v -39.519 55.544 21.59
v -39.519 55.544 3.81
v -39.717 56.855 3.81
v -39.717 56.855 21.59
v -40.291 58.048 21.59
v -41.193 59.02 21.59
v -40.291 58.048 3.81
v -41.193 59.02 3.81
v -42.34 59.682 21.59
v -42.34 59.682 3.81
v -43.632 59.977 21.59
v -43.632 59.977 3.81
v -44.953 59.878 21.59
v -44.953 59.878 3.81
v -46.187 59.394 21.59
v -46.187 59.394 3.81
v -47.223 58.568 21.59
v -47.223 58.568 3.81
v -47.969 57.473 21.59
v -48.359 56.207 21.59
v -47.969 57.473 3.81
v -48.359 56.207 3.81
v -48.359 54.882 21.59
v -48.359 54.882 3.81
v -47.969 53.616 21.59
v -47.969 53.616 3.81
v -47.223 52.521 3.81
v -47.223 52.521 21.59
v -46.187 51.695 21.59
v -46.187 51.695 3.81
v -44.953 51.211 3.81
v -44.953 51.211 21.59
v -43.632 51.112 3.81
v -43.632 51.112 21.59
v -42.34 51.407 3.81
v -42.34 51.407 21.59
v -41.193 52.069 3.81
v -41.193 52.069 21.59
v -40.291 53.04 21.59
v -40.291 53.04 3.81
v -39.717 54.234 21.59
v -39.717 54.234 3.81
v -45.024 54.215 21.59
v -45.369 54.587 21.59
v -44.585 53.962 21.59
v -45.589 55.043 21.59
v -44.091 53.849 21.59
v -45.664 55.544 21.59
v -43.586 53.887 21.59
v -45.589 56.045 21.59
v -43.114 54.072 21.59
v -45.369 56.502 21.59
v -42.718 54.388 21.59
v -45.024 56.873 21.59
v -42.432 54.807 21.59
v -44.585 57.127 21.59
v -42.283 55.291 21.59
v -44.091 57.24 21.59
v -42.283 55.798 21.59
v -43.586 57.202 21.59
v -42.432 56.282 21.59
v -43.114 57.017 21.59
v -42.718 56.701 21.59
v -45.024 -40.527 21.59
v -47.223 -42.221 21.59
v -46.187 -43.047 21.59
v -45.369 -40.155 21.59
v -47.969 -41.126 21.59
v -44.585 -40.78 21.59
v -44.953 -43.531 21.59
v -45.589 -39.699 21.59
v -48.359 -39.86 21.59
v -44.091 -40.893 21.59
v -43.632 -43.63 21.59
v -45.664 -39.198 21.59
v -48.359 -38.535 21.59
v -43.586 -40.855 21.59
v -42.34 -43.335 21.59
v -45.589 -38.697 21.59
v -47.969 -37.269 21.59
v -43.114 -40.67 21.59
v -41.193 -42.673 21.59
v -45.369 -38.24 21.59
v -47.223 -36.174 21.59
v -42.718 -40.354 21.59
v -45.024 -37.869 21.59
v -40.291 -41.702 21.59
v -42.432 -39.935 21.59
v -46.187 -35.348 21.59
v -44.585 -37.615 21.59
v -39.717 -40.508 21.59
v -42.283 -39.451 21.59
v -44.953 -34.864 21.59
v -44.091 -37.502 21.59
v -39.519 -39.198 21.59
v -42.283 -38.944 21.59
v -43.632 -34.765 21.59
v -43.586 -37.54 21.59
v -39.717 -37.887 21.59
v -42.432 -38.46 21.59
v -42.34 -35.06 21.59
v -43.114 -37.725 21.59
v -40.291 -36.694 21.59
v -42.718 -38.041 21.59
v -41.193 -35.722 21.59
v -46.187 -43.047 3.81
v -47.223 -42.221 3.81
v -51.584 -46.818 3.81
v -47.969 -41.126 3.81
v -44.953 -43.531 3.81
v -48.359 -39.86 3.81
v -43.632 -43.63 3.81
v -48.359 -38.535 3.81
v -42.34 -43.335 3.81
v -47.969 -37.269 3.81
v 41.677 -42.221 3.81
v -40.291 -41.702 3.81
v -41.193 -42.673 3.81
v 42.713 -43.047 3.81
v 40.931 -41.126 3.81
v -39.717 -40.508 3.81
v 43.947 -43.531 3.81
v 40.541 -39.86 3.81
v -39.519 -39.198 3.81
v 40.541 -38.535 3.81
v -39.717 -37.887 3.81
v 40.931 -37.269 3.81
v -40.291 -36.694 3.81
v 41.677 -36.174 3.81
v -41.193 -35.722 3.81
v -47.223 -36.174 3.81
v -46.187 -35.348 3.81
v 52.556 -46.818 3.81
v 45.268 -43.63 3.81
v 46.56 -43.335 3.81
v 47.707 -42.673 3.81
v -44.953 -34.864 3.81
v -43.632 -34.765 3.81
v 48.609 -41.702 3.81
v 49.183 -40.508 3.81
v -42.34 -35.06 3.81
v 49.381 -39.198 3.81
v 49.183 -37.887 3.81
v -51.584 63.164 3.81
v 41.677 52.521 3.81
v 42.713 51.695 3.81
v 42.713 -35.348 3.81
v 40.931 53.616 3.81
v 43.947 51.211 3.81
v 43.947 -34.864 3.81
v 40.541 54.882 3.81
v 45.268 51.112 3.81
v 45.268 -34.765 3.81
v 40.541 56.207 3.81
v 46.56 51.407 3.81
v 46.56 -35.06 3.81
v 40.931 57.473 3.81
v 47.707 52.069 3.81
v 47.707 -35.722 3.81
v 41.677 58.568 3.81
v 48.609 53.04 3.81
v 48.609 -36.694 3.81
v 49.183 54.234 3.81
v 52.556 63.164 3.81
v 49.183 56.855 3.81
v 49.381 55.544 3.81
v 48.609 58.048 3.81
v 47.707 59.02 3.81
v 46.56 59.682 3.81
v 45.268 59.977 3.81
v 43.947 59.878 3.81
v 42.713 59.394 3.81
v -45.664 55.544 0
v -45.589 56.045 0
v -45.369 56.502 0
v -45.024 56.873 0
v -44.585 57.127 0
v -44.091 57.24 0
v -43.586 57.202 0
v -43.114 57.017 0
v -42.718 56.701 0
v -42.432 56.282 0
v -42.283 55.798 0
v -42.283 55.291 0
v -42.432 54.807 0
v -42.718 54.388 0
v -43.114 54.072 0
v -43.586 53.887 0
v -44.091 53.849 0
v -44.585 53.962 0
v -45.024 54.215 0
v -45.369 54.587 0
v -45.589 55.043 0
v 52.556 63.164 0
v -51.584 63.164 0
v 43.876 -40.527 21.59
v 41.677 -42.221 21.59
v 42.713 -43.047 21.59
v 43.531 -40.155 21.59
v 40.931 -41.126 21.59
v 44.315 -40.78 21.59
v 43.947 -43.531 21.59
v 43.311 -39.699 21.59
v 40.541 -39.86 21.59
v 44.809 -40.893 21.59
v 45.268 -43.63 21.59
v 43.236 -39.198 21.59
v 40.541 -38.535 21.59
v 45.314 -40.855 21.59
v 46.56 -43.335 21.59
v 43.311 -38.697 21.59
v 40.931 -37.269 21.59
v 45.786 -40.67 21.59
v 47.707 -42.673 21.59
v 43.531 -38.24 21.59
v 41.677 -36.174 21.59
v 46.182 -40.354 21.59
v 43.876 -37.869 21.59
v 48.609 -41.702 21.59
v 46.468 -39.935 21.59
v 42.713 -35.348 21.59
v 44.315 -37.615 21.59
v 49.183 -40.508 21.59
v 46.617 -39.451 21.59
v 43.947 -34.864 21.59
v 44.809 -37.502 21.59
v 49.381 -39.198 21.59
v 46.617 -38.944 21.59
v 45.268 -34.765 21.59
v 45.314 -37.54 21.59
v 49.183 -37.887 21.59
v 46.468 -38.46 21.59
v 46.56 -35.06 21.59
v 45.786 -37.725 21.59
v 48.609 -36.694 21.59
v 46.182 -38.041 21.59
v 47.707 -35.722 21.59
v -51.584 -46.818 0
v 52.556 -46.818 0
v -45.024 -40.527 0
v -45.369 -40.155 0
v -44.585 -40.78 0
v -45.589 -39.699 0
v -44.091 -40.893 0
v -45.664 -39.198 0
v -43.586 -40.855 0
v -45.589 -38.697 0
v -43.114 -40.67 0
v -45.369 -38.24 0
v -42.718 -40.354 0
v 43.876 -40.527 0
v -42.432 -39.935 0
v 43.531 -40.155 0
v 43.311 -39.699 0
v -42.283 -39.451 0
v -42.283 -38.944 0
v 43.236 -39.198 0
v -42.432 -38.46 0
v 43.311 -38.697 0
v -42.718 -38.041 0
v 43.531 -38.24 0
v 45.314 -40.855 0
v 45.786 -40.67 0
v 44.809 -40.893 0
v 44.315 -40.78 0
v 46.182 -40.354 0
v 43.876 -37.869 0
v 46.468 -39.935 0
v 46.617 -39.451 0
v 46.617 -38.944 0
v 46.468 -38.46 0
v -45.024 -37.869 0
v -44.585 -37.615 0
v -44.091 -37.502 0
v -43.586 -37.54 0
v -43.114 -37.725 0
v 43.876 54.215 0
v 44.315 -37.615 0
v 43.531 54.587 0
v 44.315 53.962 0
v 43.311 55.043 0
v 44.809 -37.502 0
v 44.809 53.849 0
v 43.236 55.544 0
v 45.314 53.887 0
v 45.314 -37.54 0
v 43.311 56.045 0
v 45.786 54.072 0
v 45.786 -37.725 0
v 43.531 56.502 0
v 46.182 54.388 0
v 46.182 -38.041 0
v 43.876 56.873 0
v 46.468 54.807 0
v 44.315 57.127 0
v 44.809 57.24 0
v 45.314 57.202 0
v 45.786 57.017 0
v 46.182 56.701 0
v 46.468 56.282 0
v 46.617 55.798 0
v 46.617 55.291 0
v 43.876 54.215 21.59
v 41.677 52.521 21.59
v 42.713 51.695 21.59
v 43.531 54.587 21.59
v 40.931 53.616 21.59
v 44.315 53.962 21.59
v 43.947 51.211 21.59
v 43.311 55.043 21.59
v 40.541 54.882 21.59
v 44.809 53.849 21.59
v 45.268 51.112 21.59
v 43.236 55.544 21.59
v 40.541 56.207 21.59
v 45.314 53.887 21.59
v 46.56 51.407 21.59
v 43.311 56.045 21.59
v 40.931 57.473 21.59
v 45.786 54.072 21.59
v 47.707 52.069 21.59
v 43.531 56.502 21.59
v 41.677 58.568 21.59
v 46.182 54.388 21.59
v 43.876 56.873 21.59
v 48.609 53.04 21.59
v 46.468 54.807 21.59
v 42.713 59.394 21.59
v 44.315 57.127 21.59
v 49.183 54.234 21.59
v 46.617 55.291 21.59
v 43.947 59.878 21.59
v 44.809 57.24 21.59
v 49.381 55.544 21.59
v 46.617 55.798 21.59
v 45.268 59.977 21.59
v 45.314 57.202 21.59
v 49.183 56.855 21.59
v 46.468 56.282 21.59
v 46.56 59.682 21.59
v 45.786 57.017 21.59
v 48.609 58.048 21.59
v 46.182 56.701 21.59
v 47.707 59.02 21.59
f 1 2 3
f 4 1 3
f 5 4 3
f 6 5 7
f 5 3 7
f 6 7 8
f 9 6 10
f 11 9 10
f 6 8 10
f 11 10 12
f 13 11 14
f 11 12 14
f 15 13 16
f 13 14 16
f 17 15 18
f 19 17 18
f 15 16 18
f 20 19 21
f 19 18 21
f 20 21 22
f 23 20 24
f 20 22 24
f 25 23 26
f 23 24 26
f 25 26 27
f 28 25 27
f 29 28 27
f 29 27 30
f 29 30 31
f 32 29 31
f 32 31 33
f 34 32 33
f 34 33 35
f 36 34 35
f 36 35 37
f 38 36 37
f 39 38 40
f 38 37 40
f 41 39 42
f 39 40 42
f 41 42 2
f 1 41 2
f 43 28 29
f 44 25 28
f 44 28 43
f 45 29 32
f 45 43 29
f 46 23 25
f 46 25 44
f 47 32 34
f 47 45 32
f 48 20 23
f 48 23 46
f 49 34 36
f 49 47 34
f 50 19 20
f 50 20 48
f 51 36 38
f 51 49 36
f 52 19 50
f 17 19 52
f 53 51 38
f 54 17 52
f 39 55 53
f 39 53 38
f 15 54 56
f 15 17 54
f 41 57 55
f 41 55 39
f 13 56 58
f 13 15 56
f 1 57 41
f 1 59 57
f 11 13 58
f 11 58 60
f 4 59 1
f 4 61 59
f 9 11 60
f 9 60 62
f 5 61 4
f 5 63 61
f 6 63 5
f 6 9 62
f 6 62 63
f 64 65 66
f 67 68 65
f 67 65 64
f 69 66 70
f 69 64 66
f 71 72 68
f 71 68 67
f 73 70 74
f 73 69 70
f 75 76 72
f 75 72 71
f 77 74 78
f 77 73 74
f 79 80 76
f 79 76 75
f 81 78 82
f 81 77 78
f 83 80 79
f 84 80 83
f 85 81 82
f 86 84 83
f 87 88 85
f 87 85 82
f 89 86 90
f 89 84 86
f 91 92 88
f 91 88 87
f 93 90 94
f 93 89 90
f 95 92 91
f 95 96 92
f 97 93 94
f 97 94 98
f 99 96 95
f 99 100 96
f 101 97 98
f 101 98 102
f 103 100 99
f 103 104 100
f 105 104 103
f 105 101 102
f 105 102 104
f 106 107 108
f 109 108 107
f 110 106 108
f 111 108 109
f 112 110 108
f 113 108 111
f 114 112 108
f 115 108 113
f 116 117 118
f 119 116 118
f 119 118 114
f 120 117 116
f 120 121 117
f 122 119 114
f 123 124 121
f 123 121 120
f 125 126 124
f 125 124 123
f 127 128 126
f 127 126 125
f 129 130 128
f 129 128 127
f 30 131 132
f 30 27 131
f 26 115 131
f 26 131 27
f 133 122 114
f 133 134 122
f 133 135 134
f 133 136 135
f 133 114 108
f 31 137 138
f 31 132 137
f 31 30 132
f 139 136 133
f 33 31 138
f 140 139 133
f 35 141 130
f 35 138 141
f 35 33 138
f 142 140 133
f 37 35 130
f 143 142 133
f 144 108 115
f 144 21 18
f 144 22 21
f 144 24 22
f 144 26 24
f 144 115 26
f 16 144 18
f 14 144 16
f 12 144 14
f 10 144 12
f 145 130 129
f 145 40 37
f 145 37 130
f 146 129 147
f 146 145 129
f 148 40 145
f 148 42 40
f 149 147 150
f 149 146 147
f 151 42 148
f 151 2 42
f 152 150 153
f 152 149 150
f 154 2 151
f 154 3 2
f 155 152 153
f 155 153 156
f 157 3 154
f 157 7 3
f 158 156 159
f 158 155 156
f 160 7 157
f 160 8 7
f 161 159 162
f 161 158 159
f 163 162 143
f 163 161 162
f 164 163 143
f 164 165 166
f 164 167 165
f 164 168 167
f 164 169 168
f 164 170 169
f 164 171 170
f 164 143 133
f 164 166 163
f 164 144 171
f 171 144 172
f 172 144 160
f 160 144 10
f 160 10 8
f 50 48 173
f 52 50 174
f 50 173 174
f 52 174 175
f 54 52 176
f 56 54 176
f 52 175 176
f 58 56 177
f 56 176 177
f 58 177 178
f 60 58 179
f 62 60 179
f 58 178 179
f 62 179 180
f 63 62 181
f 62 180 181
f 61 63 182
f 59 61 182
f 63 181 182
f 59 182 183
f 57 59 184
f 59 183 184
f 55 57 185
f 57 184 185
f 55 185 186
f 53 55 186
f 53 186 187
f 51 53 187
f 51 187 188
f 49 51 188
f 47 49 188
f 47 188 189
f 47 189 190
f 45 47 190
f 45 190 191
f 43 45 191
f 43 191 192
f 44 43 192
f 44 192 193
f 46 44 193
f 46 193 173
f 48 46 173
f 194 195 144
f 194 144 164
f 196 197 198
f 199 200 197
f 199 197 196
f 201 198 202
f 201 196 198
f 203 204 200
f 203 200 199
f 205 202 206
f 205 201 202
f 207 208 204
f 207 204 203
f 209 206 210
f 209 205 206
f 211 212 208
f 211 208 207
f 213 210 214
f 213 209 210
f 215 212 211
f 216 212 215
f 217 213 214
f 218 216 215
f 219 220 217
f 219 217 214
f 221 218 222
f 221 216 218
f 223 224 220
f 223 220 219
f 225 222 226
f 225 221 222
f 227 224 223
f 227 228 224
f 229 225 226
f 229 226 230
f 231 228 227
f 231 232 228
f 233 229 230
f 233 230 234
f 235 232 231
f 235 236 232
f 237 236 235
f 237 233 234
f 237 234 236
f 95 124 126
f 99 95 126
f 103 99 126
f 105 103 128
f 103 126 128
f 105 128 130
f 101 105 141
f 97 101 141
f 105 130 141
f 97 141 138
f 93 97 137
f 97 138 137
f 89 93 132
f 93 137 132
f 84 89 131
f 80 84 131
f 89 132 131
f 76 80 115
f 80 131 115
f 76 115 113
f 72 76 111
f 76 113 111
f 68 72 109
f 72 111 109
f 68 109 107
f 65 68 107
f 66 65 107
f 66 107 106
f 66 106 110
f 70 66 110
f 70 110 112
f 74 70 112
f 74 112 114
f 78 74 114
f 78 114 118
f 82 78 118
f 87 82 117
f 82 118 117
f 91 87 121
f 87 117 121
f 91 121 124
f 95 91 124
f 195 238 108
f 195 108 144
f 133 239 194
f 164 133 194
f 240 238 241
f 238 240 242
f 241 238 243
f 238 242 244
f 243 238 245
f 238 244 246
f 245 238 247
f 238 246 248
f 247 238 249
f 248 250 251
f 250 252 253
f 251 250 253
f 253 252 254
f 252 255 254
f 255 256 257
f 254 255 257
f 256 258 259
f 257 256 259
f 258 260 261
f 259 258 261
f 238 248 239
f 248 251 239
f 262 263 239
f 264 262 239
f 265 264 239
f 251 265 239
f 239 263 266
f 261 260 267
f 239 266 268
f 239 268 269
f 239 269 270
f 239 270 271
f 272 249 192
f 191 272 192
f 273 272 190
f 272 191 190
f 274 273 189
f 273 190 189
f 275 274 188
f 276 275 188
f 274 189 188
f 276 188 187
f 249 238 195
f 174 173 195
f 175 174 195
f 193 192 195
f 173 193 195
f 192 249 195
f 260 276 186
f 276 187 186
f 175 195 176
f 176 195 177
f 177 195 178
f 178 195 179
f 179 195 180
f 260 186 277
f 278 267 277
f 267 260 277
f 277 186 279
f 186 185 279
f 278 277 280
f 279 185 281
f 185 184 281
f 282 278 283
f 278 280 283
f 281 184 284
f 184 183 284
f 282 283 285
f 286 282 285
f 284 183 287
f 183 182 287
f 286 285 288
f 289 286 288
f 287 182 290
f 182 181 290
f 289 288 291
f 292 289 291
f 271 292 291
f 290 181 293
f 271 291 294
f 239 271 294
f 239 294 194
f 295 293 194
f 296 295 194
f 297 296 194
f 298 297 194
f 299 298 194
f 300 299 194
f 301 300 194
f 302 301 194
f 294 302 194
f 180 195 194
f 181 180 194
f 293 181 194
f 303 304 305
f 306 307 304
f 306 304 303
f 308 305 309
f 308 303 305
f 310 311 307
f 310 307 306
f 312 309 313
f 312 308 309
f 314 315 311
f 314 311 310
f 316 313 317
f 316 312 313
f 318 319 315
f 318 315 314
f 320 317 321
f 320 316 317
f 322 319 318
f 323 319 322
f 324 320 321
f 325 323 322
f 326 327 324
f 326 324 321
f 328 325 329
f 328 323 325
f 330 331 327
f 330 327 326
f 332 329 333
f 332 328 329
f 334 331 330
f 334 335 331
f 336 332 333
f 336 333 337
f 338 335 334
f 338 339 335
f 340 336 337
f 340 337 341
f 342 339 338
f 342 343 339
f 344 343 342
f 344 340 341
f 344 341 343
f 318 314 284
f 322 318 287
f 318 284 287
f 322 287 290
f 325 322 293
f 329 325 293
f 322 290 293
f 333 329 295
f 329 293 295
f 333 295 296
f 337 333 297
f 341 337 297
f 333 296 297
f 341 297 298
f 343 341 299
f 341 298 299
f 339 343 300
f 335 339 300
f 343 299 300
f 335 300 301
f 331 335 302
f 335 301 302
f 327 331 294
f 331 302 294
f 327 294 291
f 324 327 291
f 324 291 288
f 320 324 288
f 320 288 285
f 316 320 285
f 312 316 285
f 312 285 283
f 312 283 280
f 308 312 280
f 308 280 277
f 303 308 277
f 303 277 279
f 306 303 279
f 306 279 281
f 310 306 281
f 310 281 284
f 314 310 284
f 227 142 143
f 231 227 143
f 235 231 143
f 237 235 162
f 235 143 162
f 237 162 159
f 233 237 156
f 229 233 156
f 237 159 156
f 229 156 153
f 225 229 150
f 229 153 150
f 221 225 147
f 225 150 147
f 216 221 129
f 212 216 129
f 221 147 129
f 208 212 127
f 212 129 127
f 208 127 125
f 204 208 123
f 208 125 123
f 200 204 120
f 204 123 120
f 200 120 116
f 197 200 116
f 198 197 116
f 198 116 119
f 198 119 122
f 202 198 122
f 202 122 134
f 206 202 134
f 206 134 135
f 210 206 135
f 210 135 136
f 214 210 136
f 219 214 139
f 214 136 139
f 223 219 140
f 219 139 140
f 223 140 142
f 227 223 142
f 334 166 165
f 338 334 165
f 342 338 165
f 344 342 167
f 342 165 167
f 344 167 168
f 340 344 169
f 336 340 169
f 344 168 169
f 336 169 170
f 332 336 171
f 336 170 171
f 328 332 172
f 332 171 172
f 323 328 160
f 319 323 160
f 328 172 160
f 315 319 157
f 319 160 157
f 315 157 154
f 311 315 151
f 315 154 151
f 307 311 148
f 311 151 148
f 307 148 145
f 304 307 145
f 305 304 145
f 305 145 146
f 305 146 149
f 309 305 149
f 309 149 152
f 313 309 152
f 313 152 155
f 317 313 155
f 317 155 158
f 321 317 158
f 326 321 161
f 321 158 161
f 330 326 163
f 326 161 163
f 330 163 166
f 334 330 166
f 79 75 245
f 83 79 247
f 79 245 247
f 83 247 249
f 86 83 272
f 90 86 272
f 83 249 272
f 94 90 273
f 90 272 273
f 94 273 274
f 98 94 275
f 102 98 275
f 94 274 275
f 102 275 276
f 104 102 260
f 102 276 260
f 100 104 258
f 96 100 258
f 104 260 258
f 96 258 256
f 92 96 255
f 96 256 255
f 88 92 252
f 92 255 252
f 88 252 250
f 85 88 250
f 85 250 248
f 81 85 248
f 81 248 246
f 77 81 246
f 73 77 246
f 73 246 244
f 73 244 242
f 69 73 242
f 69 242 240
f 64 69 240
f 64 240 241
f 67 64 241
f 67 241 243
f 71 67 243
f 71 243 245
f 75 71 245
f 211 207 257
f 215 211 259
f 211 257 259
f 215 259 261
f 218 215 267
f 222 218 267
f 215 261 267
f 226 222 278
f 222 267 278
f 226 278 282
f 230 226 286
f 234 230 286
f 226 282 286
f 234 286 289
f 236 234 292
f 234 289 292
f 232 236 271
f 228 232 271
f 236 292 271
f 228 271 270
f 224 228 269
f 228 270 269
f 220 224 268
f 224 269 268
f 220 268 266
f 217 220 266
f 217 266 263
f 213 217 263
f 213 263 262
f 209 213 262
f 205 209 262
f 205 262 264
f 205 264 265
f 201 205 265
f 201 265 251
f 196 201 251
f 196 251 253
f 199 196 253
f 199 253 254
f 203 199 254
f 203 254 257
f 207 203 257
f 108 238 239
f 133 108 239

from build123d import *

# Parameters (mm, degrees)
F0_W     = 104.14
F0_H     = 109.982
F1_DEPTH = 3.81
F2_R     = 4.445
F3_DEPTH = 17.78
F6_D     = 3.4


with BuildPart() as f1:
    # F0 (on Top) → F1 (new body)
    with BuildSketch(Plane.XY):
        with Locations((0.4858896136, 8.1733651346)):
            Rectangle(F0_W, F0_H)
    extrude(amount=F1_DEPTH)

    # F2 (on face) → F3 (join)
    with BuildSketch(Plane.XY.offset(3.81)):
        with Locations((-43.9641103864, 55.5443651346)):
            Circle(F2_R)
        with Locations((44.9358896136, 55.5443651346)):
            Circle(F2_R)
        with Locations((-43.9641103864, -39.1976348654)):
            Circle(F2_R)
        with Locations((44.9358896136, -39.1976348654)):
            Circle(F2_R)
    extrude(amount=F3_DEPTH)

    # F6 (through all)
    with Locations(Plane.XY.offset(21.59)):
        with Locations((-43.9641103864, 55.5443651346), (44.9358896136, 55.5443651346), (-43.9641103864, -39.1976348654), (44.9358896136, -39.1976348654)):
            Hole(F6_D / 2)


solid = f1.part
